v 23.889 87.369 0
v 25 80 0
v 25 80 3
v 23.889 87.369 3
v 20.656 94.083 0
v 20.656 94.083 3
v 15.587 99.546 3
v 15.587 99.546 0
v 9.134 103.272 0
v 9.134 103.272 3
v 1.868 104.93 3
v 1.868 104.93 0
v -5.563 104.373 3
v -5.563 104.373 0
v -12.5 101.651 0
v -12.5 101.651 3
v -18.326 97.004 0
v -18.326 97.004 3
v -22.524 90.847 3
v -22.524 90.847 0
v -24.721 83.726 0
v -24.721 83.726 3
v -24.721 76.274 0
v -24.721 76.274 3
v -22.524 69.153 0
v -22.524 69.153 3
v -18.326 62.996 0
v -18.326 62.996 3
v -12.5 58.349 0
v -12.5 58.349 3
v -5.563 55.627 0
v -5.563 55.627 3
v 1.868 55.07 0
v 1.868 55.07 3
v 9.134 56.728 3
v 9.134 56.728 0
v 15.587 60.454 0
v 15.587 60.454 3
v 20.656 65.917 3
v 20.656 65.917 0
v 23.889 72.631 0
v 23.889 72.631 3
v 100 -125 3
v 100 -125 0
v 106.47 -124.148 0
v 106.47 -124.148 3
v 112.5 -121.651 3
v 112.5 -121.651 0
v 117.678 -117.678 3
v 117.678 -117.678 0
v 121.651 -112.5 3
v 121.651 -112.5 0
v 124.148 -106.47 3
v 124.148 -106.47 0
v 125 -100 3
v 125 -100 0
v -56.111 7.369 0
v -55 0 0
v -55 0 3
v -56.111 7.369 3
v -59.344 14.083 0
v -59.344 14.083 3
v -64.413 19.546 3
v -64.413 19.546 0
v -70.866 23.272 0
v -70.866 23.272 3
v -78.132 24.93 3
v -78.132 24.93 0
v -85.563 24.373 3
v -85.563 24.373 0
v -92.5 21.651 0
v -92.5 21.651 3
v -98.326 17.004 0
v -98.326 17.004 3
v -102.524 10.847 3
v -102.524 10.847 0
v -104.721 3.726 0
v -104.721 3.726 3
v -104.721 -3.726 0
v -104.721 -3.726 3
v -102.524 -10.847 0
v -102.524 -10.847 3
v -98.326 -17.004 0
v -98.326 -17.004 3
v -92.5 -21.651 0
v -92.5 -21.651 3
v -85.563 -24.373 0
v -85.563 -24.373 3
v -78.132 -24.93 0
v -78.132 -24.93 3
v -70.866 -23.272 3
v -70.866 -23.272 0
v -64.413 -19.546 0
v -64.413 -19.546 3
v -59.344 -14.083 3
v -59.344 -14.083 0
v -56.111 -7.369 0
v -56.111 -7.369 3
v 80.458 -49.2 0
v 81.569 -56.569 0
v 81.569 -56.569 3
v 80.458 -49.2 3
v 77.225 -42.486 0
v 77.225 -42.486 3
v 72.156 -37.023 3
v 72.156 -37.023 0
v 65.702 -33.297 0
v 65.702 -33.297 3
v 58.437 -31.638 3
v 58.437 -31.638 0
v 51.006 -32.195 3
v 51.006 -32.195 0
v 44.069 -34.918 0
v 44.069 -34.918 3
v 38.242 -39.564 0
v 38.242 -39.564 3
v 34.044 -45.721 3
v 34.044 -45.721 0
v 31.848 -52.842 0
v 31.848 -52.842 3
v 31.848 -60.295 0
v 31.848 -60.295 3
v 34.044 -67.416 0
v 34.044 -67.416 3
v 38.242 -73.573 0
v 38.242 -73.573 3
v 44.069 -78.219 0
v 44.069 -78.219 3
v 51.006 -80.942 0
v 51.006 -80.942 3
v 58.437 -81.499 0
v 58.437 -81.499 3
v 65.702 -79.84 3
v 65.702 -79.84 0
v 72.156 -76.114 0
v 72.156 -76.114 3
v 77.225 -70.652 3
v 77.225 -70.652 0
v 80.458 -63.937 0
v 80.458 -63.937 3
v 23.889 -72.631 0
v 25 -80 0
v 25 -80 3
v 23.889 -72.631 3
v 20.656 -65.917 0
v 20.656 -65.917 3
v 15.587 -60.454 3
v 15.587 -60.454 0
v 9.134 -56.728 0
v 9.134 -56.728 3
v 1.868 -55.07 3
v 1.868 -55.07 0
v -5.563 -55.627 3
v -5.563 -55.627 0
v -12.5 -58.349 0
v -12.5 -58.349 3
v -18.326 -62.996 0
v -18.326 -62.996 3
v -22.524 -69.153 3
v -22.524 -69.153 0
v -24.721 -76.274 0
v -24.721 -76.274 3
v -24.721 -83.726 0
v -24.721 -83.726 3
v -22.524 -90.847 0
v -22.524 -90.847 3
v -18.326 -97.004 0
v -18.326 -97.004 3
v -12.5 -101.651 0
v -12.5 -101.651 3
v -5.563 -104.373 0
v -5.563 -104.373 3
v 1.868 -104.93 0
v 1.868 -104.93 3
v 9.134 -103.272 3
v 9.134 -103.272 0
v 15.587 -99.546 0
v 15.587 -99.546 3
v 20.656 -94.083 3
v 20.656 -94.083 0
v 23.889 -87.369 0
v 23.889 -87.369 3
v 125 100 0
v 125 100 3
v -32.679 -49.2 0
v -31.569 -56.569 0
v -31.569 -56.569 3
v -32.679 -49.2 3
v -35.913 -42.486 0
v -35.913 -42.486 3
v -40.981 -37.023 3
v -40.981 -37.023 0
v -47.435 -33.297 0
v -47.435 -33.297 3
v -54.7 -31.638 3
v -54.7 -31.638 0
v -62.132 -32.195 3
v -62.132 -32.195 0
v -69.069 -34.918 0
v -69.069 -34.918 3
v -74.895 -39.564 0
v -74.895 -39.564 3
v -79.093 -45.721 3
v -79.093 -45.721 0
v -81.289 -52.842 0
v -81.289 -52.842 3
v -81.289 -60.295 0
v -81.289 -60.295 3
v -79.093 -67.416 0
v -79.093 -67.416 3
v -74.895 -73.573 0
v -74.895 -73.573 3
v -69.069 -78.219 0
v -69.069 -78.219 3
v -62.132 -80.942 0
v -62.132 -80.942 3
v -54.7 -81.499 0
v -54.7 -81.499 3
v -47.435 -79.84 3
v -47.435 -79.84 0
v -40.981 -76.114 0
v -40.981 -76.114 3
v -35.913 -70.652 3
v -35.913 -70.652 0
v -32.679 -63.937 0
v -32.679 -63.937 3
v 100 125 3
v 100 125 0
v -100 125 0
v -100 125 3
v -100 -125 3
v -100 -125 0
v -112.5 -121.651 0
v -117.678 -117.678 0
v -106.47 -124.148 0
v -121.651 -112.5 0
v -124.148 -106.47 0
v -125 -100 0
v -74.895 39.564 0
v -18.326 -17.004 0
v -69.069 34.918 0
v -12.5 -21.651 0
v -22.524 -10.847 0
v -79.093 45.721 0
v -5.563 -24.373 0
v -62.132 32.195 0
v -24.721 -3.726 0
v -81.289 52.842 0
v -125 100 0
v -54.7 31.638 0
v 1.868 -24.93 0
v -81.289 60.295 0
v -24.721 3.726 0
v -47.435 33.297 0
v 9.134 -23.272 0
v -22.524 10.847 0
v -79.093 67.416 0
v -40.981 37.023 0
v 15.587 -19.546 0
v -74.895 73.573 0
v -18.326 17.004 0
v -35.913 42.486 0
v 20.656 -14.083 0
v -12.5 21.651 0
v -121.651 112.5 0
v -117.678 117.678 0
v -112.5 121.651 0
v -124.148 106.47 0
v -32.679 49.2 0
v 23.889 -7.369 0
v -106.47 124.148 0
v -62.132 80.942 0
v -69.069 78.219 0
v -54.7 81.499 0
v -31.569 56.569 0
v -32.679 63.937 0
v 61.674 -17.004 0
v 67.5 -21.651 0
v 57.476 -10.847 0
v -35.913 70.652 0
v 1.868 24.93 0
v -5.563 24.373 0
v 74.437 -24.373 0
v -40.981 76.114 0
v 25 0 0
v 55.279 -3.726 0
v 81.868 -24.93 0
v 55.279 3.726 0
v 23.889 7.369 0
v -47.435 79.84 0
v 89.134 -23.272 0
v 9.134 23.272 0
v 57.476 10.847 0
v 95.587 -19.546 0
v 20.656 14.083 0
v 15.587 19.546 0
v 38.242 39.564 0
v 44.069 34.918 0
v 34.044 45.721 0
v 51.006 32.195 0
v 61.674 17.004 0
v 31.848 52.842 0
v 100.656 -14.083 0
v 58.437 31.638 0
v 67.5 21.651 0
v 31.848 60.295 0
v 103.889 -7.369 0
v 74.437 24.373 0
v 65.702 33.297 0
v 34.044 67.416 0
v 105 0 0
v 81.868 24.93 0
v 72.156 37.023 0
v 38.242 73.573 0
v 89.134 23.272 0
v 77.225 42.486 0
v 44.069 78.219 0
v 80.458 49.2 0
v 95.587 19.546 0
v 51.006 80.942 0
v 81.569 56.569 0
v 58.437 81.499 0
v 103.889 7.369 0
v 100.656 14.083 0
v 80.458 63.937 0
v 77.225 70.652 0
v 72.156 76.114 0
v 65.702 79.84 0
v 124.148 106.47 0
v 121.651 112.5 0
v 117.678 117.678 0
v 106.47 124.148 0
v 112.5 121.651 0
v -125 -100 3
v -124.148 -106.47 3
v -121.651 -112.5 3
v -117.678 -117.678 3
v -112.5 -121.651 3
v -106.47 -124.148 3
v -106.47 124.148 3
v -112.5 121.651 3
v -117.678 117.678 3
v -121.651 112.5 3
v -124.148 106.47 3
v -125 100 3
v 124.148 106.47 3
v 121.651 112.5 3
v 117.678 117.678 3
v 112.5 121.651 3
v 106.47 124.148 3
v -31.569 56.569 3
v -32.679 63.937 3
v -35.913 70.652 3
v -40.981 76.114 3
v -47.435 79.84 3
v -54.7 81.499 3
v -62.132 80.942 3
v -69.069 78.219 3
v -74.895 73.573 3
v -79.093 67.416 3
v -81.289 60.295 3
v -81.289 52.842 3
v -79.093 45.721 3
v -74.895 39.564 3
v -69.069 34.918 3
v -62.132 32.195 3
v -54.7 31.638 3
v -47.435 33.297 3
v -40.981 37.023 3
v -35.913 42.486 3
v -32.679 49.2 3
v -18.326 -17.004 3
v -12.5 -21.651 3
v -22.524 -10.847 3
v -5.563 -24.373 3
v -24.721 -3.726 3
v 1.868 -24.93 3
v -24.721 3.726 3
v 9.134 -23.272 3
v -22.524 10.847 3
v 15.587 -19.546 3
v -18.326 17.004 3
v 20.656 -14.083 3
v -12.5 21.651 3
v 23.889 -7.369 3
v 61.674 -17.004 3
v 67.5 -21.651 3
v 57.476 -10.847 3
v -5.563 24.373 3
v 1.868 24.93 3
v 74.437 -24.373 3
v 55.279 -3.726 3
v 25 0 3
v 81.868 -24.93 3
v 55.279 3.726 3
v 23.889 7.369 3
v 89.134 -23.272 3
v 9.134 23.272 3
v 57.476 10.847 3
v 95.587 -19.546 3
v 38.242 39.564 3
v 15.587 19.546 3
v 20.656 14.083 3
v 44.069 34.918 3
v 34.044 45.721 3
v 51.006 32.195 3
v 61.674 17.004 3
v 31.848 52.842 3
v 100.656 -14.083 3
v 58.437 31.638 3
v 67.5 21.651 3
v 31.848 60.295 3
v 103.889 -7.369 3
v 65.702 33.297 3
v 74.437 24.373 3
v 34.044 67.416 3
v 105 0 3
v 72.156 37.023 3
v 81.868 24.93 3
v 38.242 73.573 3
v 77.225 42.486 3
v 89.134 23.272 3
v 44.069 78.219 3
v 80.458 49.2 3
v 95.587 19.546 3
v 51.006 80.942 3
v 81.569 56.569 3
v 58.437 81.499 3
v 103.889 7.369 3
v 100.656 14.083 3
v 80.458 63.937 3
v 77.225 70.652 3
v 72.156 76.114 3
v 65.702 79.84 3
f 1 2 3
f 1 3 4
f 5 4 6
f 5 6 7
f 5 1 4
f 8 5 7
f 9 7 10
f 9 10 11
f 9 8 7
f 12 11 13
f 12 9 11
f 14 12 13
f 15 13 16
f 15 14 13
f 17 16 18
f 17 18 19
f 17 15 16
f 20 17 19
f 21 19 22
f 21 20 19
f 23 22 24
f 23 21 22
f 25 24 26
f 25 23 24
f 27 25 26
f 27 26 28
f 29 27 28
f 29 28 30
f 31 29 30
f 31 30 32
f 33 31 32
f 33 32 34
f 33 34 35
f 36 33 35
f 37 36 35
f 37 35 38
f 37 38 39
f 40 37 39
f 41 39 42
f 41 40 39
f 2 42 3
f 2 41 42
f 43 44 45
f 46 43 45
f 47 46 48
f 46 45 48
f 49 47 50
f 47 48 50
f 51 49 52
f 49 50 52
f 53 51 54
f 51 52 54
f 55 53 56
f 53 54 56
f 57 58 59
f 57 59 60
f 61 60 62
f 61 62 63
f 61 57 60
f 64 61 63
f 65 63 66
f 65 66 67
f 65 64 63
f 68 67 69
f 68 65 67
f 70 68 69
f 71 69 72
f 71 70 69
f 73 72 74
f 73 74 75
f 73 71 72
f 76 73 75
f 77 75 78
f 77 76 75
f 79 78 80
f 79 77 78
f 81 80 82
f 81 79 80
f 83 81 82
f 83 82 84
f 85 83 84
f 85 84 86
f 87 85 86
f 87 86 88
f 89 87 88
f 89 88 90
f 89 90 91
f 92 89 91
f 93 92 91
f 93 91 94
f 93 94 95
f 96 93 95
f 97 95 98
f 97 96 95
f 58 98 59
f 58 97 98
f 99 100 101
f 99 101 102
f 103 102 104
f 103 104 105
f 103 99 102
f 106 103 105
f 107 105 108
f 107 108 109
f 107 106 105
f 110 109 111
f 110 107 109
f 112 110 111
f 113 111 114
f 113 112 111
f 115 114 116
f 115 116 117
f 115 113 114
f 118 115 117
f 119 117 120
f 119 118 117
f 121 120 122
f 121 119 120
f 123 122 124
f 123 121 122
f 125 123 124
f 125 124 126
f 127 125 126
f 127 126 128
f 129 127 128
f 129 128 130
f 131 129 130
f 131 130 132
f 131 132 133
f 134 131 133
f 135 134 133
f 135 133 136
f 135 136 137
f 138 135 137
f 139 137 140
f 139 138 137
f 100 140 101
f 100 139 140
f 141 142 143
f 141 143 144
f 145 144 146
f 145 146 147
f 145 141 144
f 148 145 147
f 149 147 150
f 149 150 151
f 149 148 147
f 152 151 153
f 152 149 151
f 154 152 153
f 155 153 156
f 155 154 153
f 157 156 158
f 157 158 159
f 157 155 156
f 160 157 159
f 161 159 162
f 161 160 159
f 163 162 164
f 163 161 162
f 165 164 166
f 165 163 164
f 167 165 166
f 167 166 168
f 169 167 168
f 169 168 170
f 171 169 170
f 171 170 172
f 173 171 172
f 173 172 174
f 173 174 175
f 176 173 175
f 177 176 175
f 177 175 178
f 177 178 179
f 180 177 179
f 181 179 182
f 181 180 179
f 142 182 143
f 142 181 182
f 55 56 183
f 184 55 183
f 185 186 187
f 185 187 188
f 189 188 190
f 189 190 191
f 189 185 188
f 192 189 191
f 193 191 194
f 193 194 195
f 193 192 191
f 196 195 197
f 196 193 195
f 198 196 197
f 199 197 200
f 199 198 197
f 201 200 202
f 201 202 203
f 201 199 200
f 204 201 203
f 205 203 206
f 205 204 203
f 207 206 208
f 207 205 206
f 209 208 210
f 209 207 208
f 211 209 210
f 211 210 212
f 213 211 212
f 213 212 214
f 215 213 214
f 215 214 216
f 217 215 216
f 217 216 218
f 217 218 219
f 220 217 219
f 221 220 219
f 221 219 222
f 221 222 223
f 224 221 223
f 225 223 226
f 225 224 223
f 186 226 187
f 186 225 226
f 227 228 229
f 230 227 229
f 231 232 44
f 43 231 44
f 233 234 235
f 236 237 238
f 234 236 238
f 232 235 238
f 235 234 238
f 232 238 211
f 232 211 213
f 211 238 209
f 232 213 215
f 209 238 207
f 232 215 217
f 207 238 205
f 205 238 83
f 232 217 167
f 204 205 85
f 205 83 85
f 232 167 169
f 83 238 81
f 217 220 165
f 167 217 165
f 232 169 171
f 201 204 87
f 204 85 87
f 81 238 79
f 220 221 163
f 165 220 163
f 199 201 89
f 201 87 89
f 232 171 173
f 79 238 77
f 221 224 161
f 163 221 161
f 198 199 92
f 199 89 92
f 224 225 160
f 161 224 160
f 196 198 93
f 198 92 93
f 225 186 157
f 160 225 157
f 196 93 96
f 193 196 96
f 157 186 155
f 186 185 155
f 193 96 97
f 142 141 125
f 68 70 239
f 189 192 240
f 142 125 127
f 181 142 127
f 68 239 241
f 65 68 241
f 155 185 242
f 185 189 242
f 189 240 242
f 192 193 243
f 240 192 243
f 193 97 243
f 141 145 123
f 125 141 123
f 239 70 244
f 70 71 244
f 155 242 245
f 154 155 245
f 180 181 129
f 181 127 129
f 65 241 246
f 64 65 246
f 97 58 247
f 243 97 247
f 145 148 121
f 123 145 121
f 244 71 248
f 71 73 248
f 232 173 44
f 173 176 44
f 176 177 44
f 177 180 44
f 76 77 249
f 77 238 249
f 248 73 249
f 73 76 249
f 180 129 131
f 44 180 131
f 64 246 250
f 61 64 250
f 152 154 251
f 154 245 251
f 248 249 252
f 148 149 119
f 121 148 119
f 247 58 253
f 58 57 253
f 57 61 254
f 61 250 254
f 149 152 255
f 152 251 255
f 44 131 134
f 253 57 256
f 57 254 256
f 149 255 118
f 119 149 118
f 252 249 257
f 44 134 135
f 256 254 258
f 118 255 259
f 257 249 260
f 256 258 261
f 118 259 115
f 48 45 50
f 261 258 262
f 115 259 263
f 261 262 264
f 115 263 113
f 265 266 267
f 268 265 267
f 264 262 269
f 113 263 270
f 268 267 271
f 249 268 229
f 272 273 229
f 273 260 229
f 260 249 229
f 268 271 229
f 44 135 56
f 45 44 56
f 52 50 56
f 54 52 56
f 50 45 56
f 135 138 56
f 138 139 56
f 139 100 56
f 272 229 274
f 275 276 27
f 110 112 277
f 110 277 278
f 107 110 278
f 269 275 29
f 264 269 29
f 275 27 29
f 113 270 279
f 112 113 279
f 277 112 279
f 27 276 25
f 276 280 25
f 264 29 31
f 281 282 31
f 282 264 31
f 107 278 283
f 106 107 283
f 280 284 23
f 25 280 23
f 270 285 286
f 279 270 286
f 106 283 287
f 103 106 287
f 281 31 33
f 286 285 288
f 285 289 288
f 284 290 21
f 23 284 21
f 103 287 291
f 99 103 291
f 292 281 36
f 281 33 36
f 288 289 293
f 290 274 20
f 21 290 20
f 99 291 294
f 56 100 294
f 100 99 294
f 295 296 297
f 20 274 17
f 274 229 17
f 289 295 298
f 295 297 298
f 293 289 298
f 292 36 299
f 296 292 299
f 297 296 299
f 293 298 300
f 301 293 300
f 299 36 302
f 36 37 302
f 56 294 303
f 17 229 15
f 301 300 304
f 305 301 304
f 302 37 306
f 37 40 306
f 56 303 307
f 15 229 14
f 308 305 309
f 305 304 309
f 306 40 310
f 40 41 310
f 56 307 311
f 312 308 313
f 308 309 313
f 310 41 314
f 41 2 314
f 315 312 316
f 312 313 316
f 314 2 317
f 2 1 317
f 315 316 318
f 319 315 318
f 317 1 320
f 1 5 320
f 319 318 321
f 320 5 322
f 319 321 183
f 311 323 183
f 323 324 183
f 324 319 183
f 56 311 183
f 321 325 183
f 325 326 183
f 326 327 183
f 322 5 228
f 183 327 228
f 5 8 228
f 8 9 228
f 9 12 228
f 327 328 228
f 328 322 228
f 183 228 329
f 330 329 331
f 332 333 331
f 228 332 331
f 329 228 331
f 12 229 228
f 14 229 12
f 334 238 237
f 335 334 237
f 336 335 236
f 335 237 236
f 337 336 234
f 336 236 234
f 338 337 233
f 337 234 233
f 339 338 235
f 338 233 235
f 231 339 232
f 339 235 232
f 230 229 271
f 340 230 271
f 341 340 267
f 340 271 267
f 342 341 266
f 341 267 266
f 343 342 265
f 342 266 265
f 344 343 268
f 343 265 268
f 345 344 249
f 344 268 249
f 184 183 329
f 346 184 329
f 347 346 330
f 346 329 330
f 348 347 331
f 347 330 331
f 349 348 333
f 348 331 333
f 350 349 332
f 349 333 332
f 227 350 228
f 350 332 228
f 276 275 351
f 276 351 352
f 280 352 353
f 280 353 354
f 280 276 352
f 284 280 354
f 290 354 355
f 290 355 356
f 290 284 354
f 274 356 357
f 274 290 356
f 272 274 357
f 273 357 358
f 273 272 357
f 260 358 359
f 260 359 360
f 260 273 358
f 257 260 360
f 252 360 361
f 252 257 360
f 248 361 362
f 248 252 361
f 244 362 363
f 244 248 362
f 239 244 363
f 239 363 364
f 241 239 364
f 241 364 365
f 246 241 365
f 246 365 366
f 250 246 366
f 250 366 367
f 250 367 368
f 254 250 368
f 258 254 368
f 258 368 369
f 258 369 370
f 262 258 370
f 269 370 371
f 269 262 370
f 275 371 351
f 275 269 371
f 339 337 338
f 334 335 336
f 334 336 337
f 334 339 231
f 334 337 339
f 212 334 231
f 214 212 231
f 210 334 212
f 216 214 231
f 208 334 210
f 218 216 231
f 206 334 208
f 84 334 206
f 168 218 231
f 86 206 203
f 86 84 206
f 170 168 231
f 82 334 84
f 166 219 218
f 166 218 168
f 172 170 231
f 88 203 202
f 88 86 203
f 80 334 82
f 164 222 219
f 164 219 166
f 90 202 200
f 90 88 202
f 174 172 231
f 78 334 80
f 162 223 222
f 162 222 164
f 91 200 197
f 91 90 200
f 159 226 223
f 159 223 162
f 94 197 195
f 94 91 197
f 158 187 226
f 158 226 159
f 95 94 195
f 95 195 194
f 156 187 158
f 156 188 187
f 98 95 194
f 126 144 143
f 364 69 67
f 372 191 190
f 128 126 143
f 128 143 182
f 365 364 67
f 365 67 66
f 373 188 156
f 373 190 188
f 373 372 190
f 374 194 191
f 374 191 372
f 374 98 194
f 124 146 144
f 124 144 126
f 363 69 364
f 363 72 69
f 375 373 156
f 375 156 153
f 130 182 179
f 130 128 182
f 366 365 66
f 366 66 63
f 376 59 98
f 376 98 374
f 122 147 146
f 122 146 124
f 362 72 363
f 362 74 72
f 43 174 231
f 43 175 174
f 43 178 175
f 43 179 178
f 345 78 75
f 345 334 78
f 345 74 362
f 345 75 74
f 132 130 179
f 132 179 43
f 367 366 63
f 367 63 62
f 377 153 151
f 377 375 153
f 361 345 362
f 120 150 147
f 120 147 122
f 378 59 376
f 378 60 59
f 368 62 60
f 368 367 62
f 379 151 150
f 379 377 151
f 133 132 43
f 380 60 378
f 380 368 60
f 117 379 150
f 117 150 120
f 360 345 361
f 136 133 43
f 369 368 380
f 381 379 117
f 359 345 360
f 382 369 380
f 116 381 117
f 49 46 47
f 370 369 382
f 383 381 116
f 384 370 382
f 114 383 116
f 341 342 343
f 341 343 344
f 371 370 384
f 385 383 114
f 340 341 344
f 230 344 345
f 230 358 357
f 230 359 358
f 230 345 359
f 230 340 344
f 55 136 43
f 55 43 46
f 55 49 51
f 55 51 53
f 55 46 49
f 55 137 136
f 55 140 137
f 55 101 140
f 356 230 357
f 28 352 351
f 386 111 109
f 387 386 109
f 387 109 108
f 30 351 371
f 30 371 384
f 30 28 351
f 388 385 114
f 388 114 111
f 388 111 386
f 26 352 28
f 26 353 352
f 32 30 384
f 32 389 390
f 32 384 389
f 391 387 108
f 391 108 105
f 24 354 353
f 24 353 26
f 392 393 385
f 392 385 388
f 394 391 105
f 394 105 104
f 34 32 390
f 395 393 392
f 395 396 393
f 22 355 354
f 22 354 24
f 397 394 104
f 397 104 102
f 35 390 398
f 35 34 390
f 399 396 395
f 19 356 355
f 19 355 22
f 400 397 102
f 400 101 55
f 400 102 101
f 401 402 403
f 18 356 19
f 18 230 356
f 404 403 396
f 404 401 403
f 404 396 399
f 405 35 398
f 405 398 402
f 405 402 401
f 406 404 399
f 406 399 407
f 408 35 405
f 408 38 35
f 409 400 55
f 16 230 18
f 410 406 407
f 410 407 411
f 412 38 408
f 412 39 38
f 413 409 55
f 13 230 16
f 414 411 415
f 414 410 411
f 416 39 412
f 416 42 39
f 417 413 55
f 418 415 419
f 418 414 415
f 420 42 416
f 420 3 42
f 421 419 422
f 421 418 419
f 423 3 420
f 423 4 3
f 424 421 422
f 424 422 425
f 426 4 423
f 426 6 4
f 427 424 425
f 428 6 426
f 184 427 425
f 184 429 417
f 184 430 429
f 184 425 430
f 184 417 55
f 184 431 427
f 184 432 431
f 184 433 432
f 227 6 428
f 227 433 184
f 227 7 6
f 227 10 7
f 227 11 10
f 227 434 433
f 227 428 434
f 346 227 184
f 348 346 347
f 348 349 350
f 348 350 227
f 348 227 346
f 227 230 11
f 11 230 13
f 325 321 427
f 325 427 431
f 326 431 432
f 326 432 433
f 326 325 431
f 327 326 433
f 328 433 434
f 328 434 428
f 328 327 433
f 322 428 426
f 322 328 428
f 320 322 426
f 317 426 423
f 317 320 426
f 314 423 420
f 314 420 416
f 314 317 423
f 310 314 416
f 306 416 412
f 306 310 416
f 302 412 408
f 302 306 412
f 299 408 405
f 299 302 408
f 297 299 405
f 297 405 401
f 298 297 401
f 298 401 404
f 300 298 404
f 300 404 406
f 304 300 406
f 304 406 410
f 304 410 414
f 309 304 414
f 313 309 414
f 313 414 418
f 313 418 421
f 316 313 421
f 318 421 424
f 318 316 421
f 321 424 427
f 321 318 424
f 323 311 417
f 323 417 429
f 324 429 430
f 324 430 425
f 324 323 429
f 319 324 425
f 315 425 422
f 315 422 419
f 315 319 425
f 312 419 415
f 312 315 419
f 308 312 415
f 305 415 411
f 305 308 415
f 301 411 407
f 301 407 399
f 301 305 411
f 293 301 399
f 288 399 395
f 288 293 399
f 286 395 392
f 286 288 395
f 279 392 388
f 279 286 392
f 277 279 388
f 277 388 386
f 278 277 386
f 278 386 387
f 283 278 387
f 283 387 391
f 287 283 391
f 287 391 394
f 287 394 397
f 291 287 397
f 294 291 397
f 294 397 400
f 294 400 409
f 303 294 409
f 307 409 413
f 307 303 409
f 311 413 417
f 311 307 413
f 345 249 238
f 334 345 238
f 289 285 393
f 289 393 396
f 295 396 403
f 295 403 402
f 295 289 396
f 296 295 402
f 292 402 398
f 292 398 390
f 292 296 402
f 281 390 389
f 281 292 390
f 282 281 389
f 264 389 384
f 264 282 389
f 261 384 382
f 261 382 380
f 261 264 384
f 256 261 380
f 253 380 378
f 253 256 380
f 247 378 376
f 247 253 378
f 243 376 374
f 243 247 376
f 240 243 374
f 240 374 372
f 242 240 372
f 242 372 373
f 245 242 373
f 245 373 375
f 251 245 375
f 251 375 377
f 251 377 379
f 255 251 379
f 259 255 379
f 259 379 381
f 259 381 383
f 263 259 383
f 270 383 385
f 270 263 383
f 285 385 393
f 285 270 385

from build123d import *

# Parameters (mm, degrees)
F0_R     = 25
F1_DEPTH = 3


with BuildPart() as f1:
    # F0 (on Top) → F1 (new body)
    with BuildSketch(Plane.XY):
        with BuildLine():
            ThreePointArc((125, 100), (117.67767, 117.67767), (100, 125))
            Line((100, 125), (-100, 125))
            ThreePointArc((-100, 125), (-117.67767, 117.67767), (-125, 100))
            Line((-125, 100), (-125, -100))
            ThreePointArc((-125, -100), (-117.67767, -117.67767), (-100, -125))
            Line((-100, -125), (100, -125))
            ThreePointArc((100, -125), (117.67767, -117.67767), (125, -100))
            Line((125, -100), (125, 100))
        make_face()
        with Locations((-56.568542, -56.568542)):
            Circle(F0_R, mode=Mode.SUBTRACT)
        with Locations((0, -80)):
            Circle(F0_R, mode=Mode.SUBTRACT)
        with Locations((56.568542, -56.568542)):
            Circle(F0_R, mode=Mode.SUBTRACT)
        with Locations((-80, 0)):
            Circle(F0_R, mode=Mode.SUBTRACT)
        with Locations((-56.568542, 56.568542)):
            Circle(F0_R, mode=Mode.SUBTRACT)
        Circle(F0_R, mode=Mode.SUBTRACT)
        with Locations((56.568542, 56.568542)):
            Circle(F0_R, mode=Mode.SUBTRACT)
        with Locations((80, 0)):
            Circle(F0_R, mode=Mode.SUBTRACT)
        with Locations((0, 80)):
            Circle(F0_R, mode=Mode.SUBTRACT)
    extrude(amount=F1_DEPTH)


solid = f1.part
